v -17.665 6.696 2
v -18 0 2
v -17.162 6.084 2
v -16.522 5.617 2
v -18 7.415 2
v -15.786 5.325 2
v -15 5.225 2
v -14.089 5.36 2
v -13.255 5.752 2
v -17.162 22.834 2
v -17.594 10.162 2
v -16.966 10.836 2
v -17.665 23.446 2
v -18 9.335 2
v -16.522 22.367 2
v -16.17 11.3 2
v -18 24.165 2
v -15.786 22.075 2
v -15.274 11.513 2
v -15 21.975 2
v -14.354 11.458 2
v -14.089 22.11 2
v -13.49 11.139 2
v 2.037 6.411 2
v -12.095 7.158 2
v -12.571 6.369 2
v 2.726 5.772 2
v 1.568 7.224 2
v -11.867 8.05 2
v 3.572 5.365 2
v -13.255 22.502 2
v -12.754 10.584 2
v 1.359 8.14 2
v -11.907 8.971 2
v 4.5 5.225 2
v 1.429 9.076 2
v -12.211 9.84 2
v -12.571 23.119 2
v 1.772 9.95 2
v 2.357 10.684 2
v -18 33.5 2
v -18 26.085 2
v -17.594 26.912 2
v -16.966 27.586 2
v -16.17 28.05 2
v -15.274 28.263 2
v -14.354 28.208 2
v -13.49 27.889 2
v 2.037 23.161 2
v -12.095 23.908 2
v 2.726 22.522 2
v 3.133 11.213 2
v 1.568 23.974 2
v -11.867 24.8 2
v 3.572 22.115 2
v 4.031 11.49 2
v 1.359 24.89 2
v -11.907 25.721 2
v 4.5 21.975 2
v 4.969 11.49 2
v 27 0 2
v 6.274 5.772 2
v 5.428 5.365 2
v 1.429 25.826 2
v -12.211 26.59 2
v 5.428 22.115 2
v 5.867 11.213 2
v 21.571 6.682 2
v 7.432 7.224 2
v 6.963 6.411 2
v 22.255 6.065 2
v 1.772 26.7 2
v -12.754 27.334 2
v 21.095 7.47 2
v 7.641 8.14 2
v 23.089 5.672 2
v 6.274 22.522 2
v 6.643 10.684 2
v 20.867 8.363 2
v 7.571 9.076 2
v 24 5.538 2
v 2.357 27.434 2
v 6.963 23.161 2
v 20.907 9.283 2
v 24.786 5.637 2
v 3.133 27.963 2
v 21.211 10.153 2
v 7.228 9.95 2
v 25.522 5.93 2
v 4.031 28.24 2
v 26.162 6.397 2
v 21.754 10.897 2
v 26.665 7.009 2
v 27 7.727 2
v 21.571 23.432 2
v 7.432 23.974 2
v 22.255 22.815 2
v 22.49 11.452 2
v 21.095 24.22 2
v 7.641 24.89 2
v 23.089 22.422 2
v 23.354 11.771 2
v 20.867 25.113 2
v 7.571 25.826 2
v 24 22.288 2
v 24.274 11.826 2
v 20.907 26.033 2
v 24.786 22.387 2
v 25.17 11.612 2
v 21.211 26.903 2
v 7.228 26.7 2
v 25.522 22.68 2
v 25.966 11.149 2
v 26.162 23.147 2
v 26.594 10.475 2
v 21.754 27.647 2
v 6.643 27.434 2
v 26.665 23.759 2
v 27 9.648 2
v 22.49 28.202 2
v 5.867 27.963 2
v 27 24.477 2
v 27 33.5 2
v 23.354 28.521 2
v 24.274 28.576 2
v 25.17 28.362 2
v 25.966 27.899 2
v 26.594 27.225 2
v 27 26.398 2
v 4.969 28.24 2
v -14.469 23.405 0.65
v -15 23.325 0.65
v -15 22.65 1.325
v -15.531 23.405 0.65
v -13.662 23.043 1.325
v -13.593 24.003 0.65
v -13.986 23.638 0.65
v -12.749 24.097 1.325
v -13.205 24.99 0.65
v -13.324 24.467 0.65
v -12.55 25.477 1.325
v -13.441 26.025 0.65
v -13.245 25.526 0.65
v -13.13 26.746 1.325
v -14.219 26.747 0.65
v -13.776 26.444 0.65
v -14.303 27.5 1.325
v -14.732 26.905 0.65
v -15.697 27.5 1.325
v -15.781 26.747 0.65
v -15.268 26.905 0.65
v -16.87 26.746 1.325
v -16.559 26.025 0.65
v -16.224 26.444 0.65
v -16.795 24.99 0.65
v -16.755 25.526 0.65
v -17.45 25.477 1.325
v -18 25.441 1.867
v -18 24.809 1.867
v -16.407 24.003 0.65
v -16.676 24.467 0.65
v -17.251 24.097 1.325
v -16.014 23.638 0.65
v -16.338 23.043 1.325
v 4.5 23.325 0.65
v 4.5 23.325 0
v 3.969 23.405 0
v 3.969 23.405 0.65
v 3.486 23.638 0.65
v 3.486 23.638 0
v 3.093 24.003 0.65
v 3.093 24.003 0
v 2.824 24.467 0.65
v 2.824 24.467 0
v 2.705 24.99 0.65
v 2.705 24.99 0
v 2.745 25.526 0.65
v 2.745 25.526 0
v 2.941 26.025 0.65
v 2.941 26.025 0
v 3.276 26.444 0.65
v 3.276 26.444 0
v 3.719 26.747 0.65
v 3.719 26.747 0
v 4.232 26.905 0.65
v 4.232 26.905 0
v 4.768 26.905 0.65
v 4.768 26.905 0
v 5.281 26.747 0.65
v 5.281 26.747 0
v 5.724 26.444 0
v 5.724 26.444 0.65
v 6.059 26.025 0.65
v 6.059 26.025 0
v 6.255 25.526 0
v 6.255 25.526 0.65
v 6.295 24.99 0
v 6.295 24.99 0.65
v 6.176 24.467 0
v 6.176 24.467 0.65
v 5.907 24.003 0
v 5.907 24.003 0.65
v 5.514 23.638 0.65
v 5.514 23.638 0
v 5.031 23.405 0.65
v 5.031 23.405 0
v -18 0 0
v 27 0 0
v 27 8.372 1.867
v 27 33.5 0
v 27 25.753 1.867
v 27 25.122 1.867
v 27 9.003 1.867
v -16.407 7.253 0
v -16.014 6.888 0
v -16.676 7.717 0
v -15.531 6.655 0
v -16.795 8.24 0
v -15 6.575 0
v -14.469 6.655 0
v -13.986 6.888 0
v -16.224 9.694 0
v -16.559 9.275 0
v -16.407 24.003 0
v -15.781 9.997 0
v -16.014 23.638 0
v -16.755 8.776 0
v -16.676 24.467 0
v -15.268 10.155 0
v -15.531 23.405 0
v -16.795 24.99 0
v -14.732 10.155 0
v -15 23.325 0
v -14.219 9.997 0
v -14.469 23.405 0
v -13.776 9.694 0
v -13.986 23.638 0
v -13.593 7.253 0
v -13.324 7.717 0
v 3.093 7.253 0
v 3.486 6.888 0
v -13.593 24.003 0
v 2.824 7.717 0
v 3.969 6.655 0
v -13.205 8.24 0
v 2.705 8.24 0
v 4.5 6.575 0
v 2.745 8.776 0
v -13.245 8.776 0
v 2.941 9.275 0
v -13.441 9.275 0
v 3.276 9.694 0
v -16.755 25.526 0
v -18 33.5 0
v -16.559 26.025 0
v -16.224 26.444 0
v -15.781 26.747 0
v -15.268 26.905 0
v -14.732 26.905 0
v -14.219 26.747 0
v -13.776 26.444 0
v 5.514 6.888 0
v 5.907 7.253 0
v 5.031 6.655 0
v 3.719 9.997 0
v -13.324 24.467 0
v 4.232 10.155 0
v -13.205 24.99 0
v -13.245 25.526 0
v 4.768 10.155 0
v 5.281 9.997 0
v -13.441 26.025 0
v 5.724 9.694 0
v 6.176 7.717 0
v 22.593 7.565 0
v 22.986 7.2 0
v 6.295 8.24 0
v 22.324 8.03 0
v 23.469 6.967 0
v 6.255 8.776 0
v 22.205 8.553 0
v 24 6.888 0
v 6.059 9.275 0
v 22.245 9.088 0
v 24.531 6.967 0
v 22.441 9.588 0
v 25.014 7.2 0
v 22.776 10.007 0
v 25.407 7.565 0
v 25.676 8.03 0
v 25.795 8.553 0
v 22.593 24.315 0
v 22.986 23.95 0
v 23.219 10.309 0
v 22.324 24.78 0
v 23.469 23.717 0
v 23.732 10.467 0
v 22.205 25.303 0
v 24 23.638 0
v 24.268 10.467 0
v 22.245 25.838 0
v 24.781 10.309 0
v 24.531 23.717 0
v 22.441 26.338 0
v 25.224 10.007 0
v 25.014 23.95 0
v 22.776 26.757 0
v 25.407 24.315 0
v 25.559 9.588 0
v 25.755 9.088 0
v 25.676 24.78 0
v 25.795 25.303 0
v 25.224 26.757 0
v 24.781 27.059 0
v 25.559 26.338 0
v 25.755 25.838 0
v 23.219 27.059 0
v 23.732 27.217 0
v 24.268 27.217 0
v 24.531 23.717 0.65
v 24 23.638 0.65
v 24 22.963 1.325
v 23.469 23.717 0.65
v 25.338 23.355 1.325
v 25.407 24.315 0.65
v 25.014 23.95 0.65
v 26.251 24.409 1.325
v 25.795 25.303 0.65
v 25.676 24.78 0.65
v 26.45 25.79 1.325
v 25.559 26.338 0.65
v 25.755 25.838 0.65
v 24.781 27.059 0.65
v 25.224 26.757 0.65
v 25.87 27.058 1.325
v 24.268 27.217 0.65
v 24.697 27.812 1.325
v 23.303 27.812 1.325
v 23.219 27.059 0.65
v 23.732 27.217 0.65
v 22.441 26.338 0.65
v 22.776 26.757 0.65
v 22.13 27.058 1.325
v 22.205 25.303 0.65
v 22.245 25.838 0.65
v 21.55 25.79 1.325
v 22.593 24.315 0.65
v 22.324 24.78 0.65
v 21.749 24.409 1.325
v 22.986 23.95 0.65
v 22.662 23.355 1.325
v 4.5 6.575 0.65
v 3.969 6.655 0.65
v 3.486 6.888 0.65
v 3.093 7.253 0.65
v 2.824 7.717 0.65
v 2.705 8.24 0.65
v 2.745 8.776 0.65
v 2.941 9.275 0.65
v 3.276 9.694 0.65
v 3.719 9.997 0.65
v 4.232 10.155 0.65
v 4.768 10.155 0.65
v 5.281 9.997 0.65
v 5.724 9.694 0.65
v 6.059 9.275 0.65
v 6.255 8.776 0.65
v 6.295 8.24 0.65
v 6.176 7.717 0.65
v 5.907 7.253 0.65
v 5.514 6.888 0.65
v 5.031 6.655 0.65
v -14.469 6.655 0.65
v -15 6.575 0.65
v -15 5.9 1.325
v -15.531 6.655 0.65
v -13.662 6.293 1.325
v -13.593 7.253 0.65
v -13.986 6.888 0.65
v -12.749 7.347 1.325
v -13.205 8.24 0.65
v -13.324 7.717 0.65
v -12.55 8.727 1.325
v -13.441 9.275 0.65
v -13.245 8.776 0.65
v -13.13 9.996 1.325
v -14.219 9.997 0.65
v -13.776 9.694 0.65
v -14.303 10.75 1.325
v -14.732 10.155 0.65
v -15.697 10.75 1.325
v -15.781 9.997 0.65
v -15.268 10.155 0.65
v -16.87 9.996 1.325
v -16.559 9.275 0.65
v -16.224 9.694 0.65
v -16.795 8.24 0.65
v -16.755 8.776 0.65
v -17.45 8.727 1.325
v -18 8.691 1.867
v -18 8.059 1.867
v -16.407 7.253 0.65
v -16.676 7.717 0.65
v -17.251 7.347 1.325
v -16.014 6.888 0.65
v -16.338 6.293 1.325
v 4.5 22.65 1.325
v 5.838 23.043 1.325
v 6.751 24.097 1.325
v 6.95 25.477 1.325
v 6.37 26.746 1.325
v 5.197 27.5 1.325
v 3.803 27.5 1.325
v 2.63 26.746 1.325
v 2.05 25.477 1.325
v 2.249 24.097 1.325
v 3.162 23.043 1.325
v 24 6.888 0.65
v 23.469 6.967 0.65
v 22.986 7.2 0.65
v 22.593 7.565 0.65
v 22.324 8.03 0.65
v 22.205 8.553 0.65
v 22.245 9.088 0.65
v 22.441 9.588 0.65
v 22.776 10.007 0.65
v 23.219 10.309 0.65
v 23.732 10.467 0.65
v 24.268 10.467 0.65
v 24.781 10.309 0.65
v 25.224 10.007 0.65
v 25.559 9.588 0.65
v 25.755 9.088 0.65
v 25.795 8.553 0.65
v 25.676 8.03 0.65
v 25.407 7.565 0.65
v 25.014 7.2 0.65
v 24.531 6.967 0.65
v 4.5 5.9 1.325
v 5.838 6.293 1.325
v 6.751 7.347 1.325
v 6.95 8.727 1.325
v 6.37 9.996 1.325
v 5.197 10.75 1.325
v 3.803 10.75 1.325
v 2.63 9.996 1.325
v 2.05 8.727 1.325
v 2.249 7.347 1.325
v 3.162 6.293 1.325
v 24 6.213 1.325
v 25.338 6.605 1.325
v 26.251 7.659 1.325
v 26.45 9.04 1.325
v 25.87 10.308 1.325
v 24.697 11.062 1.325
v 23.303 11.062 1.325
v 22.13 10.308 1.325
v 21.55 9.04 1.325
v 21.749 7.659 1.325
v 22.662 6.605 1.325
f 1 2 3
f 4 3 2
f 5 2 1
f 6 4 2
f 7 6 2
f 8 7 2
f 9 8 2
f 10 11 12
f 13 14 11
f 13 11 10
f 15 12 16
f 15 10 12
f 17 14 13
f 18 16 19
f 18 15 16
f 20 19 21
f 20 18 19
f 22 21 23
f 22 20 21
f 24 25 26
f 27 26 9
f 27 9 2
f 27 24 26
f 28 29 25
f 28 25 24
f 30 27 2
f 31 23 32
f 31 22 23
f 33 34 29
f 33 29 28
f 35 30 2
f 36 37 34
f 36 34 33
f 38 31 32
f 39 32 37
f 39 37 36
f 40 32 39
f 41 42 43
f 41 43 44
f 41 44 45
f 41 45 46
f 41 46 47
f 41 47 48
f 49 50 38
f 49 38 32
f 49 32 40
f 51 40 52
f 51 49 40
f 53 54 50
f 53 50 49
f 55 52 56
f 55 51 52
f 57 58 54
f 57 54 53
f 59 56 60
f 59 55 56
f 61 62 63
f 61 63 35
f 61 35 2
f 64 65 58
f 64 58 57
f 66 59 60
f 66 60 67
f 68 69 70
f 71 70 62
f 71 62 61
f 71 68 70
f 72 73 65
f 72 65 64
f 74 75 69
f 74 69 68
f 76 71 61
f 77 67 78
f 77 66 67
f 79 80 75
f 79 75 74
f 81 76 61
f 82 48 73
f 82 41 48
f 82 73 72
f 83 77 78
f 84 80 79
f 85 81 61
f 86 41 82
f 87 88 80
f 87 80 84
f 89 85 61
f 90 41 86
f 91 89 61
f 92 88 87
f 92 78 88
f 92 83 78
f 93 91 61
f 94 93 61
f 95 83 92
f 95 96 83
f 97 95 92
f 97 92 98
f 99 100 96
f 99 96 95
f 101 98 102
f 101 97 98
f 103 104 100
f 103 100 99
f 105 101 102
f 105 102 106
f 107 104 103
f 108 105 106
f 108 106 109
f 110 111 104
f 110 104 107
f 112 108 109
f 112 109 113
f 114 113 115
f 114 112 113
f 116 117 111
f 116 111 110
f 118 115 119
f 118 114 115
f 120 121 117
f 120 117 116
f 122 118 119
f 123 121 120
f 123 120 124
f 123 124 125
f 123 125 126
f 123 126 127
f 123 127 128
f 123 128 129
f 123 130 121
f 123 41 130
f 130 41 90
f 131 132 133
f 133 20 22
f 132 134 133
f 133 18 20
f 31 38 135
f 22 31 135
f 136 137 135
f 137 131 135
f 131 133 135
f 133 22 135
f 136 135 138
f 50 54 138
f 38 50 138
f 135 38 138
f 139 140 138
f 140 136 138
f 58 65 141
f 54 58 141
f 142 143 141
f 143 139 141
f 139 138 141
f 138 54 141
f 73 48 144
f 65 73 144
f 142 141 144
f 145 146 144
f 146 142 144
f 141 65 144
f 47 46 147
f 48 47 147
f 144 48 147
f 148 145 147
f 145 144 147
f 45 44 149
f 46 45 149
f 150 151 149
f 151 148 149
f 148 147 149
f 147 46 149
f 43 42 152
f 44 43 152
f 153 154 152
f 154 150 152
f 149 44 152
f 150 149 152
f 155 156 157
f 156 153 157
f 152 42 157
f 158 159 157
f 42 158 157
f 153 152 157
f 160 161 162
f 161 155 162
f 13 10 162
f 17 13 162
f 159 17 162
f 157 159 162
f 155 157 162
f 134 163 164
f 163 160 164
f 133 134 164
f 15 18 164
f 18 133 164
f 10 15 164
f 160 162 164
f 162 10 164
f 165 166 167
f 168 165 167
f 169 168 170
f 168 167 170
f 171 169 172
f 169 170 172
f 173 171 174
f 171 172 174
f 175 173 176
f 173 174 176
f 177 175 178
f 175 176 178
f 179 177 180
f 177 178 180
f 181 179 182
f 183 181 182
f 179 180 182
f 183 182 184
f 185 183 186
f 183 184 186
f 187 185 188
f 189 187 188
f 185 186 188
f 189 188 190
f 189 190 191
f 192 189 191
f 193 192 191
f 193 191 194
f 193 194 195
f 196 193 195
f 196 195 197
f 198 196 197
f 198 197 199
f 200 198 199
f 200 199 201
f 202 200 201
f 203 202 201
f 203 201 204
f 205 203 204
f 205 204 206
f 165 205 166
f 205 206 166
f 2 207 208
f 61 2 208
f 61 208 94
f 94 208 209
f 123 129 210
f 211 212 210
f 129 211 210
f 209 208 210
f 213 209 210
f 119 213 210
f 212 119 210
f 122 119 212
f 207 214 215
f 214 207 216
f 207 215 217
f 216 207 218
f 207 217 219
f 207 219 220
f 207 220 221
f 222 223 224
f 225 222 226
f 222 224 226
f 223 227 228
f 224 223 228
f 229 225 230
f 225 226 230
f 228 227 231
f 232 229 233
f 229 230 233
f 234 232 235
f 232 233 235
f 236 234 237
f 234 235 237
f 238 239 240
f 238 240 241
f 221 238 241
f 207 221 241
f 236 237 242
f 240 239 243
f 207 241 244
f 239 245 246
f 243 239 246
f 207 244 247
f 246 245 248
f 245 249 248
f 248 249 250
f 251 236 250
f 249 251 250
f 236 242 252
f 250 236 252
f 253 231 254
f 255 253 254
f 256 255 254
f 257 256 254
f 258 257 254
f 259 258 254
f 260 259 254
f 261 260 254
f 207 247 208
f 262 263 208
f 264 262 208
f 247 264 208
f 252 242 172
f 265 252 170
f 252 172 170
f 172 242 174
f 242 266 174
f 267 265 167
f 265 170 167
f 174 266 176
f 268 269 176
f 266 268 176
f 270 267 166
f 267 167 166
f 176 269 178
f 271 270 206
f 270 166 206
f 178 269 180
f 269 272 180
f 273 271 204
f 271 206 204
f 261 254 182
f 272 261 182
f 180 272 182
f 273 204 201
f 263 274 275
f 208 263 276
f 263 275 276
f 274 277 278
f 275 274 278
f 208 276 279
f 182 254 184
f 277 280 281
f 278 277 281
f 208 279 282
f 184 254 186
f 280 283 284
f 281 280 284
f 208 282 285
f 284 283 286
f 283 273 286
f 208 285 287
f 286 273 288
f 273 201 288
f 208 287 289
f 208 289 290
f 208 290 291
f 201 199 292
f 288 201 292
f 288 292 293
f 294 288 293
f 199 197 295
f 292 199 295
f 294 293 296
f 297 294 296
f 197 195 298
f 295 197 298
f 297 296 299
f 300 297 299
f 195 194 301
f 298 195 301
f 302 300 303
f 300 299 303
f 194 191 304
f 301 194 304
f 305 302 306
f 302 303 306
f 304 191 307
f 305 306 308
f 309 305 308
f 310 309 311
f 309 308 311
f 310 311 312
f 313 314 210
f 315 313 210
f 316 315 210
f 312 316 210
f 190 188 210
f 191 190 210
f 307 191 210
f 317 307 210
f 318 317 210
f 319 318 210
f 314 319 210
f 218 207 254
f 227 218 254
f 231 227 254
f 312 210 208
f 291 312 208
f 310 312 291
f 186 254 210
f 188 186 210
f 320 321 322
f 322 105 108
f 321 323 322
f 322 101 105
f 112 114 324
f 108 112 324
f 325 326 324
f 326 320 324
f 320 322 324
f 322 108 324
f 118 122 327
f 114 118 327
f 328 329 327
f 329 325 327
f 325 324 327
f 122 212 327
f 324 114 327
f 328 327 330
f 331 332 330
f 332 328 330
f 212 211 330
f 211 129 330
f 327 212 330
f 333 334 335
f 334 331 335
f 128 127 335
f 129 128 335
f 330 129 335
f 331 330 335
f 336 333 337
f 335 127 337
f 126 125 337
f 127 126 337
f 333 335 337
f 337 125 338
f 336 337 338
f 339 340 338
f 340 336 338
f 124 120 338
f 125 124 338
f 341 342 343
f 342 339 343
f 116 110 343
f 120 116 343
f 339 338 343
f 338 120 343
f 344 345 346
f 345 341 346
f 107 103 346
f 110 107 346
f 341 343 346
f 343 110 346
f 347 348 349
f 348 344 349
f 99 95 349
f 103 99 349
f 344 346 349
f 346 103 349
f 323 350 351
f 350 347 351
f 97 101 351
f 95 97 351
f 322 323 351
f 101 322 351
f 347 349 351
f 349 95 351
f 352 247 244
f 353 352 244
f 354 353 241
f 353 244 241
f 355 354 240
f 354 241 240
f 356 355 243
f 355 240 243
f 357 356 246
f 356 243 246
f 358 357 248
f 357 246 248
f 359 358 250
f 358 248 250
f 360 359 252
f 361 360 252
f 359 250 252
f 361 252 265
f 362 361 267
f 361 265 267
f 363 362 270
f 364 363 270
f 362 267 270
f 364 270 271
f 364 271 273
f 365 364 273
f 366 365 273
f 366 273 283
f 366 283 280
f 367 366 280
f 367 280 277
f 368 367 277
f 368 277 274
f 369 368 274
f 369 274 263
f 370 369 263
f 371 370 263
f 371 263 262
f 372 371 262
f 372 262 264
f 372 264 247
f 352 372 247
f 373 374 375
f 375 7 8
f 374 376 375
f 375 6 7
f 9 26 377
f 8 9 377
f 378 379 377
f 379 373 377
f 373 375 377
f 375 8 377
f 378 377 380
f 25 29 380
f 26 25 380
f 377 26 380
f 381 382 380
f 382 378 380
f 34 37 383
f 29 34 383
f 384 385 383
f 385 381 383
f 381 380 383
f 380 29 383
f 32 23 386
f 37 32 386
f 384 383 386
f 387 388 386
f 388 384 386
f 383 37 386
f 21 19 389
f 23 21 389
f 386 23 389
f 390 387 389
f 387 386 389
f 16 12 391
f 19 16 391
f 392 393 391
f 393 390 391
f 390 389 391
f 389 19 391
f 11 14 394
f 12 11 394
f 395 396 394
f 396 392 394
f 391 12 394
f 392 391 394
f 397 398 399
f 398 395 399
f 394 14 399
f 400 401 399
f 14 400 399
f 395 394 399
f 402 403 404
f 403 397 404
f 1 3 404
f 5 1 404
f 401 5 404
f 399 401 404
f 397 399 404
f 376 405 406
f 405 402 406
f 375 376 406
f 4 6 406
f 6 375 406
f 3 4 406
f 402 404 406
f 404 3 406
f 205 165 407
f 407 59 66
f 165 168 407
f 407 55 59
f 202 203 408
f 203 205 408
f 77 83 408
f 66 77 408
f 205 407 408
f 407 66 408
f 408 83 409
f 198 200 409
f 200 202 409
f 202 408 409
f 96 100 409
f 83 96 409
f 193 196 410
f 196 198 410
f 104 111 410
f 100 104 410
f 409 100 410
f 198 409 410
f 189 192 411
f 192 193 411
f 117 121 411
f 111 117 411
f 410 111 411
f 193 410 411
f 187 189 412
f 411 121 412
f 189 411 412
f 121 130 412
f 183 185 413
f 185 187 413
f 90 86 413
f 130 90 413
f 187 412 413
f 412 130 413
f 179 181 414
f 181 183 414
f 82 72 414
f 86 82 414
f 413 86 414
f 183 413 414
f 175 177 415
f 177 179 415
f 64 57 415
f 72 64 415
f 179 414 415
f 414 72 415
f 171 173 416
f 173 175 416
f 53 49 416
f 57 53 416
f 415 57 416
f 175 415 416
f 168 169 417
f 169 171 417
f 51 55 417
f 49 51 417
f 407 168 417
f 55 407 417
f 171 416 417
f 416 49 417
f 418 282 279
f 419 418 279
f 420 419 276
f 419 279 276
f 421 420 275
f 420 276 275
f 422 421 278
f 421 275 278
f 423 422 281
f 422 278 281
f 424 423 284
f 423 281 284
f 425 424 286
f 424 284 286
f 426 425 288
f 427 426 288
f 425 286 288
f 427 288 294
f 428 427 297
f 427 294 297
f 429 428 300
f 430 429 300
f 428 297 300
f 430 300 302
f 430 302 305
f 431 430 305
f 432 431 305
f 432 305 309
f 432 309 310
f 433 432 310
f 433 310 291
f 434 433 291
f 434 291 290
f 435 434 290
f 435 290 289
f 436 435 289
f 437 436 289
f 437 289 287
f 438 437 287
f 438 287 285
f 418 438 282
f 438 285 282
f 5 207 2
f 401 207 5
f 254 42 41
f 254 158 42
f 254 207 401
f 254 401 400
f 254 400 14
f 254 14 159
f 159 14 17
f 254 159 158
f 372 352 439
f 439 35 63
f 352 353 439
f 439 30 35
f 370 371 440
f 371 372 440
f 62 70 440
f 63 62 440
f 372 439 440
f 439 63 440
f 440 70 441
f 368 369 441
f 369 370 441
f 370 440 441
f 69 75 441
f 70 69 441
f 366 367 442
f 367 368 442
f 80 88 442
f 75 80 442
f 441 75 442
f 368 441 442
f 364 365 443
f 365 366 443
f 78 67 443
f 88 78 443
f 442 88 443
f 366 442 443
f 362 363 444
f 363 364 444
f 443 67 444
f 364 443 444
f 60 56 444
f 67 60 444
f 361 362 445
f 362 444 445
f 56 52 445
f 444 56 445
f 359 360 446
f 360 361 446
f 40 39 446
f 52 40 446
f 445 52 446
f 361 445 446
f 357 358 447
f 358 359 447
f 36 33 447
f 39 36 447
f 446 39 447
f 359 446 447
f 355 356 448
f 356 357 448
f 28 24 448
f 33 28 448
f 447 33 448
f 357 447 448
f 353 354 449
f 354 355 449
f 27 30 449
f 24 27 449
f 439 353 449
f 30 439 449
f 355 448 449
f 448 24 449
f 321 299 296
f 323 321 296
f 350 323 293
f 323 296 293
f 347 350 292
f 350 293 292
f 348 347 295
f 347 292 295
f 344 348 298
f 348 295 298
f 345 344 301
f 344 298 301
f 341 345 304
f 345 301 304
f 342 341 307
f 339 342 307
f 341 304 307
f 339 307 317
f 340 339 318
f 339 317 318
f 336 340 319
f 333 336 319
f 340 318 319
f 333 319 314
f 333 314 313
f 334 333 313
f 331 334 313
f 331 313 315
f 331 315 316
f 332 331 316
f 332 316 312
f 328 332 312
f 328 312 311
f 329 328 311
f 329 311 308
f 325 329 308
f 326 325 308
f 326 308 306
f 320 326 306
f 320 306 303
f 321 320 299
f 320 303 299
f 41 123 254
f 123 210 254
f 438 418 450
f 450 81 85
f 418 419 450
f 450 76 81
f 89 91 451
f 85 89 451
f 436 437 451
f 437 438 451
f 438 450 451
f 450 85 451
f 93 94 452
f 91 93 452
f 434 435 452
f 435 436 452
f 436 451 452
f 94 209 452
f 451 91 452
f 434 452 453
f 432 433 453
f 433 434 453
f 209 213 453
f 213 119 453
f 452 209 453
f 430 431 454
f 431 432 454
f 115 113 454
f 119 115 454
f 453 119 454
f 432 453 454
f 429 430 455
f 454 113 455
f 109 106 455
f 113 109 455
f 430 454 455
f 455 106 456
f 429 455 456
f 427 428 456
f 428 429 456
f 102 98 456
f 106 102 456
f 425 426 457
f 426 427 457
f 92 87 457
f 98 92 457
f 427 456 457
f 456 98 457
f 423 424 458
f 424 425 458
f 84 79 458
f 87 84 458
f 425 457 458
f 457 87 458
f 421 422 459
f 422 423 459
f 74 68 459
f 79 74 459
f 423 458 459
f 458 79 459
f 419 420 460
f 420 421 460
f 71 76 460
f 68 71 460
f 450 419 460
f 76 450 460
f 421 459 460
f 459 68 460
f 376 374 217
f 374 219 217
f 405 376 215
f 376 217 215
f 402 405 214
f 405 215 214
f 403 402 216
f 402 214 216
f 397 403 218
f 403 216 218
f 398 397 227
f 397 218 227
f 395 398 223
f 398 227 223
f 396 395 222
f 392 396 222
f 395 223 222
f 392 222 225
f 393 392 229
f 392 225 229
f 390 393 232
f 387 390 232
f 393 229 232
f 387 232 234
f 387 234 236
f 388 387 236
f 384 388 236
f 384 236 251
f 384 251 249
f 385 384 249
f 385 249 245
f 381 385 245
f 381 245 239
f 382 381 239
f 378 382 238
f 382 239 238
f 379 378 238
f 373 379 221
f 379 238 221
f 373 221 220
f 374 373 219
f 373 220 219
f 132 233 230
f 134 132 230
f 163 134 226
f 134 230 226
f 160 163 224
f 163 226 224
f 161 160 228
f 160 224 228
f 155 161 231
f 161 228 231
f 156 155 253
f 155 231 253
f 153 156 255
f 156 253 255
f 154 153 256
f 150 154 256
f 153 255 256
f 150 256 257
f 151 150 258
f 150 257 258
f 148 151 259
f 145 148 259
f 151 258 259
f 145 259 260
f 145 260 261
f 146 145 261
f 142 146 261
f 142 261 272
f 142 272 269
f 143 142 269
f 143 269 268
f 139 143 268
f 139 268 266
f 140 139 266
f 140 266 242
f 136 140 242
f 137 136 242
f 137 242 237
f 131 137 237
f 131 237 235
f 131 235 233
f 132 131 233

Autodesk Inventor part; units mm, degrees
ref_plane "YZ Plane" through (0, 0, 0) normal (1, 0, 0) x (0, 1, 0)
ref_plane "XZ Plane" through (0, 0, 0) normal (0, 1, 0) x (-1, 0, 0)
ref_plane "Work Plane1" through (0, 0, 0) normal (0, 0, 1) x (1, 0, 0)
sketch "Sketch1" plane through (0, 0, 0) normal (0, 0, 1) x (1, 0, 0)
  line L0 (-12, 33.5) -> (-18, 33.5) projected
  line L1 (-18, 0) -> (-18, 33.5) projected
  line L2 (-18, 0) -> (-12, 0) projected
  line L3 (-12, 0) -> (-12, 33.5) projected
  line L4 (27, 33.5) -> (21, 33.5) projected
  line L5 (21, 0) -> (21, 33.5) projected
  line L6 (21, 0) -> (27, 0) projected
  line L7 (27, 0) -> (27, 33.5) projected
  line L8 (-18, 33.5) -> (27, 33.5)
  line L9 (27, 33.5) -> (27, 0)
  line L10 (27, 0) -> (-18, 0)
  line L11 (-18, 0) -> (-18, 33.5)
  circle A0 centre (-15, 25.125) radius 2.3 projected
  circle A1 centre (-15, 8.375) radius 2.3 projected
  circle A2 centre (24, 25.4375) radius 2.3 projected
  circle A3 centre (24, 8.6875) radius 2.3 projected
  point P0 (0, 0)
ref_plane "Work Plane2" through (-69.2, 0, 2) normal (0, 0, -1) x (0, 1, 0)
extrude "Extrusion1" add sketch "Sketch1" along normal up to surface (2 mm away) contours L3 L2 L1 L0 | L8 L5 L10 L3 | L4 L7 L6 L5 | A0 | A1 | A2 | A3
sketch "Sketch2" plane through (-18, 33.5, 2) normal (0, 0, 1) x (1, 0, 0)
  circle A0 centre (3, -8.375) radius 2.3 projected
  circle A1 centre (3, -25.125) radius 2.3 projected
  line L0 (6, 0) -> (0, 0) projected
  line L1 (0, -33.5) -> (0, 0) projected
  line L2 (0, -33.5) -> (6, -33.5) projected
  line L3 (6, -33.5) -> (6, 0) projected
  circle A2 centre (22.5, -25.125) radius 2.3 projected
  circle A3 centre (22.5, -8.375) radius 2.3 projected
  line L4 (27, 0) -> (18, 0) projected
  line L5 (18, -33.5) -> (18, 0) projected
  line L6 (18, -33.5) -> (27, -33.5) projected
  line L7 (27, -33.5) -> (27, 0) projected
  circle A4 centre (42, -8.0625) radius 2.3 projected
  circle A5 centre (42, -24.8125) radius 2.3 projected
  line L8 (45, 0) -> (39, 0) projected
  line L9 (39, -33.5) -> (39, 0) projected
  line L10 (39, -33.5) -> (45, -33.5) projected
  line L11 (45, -33.5) -> (45, 0) projected
hole "Hole1" at (-15, 25.125, 2) at (-15, 8.375, 2) at (4.5, 8.375, 2) at (4.5, 25.125, 2) at (24, 25.4375, 2) at (24, 8.6875, 2) direction (0, 0, -1) diameter 3.6 end through all countersink diameter 6.3 countersink angle 90 clearance for "Countersunk Flat Head Screw ISO 2009/7046" size "M3" standard "ISO"
properties part number "front_gear_holder" material "ABS Plastic"
